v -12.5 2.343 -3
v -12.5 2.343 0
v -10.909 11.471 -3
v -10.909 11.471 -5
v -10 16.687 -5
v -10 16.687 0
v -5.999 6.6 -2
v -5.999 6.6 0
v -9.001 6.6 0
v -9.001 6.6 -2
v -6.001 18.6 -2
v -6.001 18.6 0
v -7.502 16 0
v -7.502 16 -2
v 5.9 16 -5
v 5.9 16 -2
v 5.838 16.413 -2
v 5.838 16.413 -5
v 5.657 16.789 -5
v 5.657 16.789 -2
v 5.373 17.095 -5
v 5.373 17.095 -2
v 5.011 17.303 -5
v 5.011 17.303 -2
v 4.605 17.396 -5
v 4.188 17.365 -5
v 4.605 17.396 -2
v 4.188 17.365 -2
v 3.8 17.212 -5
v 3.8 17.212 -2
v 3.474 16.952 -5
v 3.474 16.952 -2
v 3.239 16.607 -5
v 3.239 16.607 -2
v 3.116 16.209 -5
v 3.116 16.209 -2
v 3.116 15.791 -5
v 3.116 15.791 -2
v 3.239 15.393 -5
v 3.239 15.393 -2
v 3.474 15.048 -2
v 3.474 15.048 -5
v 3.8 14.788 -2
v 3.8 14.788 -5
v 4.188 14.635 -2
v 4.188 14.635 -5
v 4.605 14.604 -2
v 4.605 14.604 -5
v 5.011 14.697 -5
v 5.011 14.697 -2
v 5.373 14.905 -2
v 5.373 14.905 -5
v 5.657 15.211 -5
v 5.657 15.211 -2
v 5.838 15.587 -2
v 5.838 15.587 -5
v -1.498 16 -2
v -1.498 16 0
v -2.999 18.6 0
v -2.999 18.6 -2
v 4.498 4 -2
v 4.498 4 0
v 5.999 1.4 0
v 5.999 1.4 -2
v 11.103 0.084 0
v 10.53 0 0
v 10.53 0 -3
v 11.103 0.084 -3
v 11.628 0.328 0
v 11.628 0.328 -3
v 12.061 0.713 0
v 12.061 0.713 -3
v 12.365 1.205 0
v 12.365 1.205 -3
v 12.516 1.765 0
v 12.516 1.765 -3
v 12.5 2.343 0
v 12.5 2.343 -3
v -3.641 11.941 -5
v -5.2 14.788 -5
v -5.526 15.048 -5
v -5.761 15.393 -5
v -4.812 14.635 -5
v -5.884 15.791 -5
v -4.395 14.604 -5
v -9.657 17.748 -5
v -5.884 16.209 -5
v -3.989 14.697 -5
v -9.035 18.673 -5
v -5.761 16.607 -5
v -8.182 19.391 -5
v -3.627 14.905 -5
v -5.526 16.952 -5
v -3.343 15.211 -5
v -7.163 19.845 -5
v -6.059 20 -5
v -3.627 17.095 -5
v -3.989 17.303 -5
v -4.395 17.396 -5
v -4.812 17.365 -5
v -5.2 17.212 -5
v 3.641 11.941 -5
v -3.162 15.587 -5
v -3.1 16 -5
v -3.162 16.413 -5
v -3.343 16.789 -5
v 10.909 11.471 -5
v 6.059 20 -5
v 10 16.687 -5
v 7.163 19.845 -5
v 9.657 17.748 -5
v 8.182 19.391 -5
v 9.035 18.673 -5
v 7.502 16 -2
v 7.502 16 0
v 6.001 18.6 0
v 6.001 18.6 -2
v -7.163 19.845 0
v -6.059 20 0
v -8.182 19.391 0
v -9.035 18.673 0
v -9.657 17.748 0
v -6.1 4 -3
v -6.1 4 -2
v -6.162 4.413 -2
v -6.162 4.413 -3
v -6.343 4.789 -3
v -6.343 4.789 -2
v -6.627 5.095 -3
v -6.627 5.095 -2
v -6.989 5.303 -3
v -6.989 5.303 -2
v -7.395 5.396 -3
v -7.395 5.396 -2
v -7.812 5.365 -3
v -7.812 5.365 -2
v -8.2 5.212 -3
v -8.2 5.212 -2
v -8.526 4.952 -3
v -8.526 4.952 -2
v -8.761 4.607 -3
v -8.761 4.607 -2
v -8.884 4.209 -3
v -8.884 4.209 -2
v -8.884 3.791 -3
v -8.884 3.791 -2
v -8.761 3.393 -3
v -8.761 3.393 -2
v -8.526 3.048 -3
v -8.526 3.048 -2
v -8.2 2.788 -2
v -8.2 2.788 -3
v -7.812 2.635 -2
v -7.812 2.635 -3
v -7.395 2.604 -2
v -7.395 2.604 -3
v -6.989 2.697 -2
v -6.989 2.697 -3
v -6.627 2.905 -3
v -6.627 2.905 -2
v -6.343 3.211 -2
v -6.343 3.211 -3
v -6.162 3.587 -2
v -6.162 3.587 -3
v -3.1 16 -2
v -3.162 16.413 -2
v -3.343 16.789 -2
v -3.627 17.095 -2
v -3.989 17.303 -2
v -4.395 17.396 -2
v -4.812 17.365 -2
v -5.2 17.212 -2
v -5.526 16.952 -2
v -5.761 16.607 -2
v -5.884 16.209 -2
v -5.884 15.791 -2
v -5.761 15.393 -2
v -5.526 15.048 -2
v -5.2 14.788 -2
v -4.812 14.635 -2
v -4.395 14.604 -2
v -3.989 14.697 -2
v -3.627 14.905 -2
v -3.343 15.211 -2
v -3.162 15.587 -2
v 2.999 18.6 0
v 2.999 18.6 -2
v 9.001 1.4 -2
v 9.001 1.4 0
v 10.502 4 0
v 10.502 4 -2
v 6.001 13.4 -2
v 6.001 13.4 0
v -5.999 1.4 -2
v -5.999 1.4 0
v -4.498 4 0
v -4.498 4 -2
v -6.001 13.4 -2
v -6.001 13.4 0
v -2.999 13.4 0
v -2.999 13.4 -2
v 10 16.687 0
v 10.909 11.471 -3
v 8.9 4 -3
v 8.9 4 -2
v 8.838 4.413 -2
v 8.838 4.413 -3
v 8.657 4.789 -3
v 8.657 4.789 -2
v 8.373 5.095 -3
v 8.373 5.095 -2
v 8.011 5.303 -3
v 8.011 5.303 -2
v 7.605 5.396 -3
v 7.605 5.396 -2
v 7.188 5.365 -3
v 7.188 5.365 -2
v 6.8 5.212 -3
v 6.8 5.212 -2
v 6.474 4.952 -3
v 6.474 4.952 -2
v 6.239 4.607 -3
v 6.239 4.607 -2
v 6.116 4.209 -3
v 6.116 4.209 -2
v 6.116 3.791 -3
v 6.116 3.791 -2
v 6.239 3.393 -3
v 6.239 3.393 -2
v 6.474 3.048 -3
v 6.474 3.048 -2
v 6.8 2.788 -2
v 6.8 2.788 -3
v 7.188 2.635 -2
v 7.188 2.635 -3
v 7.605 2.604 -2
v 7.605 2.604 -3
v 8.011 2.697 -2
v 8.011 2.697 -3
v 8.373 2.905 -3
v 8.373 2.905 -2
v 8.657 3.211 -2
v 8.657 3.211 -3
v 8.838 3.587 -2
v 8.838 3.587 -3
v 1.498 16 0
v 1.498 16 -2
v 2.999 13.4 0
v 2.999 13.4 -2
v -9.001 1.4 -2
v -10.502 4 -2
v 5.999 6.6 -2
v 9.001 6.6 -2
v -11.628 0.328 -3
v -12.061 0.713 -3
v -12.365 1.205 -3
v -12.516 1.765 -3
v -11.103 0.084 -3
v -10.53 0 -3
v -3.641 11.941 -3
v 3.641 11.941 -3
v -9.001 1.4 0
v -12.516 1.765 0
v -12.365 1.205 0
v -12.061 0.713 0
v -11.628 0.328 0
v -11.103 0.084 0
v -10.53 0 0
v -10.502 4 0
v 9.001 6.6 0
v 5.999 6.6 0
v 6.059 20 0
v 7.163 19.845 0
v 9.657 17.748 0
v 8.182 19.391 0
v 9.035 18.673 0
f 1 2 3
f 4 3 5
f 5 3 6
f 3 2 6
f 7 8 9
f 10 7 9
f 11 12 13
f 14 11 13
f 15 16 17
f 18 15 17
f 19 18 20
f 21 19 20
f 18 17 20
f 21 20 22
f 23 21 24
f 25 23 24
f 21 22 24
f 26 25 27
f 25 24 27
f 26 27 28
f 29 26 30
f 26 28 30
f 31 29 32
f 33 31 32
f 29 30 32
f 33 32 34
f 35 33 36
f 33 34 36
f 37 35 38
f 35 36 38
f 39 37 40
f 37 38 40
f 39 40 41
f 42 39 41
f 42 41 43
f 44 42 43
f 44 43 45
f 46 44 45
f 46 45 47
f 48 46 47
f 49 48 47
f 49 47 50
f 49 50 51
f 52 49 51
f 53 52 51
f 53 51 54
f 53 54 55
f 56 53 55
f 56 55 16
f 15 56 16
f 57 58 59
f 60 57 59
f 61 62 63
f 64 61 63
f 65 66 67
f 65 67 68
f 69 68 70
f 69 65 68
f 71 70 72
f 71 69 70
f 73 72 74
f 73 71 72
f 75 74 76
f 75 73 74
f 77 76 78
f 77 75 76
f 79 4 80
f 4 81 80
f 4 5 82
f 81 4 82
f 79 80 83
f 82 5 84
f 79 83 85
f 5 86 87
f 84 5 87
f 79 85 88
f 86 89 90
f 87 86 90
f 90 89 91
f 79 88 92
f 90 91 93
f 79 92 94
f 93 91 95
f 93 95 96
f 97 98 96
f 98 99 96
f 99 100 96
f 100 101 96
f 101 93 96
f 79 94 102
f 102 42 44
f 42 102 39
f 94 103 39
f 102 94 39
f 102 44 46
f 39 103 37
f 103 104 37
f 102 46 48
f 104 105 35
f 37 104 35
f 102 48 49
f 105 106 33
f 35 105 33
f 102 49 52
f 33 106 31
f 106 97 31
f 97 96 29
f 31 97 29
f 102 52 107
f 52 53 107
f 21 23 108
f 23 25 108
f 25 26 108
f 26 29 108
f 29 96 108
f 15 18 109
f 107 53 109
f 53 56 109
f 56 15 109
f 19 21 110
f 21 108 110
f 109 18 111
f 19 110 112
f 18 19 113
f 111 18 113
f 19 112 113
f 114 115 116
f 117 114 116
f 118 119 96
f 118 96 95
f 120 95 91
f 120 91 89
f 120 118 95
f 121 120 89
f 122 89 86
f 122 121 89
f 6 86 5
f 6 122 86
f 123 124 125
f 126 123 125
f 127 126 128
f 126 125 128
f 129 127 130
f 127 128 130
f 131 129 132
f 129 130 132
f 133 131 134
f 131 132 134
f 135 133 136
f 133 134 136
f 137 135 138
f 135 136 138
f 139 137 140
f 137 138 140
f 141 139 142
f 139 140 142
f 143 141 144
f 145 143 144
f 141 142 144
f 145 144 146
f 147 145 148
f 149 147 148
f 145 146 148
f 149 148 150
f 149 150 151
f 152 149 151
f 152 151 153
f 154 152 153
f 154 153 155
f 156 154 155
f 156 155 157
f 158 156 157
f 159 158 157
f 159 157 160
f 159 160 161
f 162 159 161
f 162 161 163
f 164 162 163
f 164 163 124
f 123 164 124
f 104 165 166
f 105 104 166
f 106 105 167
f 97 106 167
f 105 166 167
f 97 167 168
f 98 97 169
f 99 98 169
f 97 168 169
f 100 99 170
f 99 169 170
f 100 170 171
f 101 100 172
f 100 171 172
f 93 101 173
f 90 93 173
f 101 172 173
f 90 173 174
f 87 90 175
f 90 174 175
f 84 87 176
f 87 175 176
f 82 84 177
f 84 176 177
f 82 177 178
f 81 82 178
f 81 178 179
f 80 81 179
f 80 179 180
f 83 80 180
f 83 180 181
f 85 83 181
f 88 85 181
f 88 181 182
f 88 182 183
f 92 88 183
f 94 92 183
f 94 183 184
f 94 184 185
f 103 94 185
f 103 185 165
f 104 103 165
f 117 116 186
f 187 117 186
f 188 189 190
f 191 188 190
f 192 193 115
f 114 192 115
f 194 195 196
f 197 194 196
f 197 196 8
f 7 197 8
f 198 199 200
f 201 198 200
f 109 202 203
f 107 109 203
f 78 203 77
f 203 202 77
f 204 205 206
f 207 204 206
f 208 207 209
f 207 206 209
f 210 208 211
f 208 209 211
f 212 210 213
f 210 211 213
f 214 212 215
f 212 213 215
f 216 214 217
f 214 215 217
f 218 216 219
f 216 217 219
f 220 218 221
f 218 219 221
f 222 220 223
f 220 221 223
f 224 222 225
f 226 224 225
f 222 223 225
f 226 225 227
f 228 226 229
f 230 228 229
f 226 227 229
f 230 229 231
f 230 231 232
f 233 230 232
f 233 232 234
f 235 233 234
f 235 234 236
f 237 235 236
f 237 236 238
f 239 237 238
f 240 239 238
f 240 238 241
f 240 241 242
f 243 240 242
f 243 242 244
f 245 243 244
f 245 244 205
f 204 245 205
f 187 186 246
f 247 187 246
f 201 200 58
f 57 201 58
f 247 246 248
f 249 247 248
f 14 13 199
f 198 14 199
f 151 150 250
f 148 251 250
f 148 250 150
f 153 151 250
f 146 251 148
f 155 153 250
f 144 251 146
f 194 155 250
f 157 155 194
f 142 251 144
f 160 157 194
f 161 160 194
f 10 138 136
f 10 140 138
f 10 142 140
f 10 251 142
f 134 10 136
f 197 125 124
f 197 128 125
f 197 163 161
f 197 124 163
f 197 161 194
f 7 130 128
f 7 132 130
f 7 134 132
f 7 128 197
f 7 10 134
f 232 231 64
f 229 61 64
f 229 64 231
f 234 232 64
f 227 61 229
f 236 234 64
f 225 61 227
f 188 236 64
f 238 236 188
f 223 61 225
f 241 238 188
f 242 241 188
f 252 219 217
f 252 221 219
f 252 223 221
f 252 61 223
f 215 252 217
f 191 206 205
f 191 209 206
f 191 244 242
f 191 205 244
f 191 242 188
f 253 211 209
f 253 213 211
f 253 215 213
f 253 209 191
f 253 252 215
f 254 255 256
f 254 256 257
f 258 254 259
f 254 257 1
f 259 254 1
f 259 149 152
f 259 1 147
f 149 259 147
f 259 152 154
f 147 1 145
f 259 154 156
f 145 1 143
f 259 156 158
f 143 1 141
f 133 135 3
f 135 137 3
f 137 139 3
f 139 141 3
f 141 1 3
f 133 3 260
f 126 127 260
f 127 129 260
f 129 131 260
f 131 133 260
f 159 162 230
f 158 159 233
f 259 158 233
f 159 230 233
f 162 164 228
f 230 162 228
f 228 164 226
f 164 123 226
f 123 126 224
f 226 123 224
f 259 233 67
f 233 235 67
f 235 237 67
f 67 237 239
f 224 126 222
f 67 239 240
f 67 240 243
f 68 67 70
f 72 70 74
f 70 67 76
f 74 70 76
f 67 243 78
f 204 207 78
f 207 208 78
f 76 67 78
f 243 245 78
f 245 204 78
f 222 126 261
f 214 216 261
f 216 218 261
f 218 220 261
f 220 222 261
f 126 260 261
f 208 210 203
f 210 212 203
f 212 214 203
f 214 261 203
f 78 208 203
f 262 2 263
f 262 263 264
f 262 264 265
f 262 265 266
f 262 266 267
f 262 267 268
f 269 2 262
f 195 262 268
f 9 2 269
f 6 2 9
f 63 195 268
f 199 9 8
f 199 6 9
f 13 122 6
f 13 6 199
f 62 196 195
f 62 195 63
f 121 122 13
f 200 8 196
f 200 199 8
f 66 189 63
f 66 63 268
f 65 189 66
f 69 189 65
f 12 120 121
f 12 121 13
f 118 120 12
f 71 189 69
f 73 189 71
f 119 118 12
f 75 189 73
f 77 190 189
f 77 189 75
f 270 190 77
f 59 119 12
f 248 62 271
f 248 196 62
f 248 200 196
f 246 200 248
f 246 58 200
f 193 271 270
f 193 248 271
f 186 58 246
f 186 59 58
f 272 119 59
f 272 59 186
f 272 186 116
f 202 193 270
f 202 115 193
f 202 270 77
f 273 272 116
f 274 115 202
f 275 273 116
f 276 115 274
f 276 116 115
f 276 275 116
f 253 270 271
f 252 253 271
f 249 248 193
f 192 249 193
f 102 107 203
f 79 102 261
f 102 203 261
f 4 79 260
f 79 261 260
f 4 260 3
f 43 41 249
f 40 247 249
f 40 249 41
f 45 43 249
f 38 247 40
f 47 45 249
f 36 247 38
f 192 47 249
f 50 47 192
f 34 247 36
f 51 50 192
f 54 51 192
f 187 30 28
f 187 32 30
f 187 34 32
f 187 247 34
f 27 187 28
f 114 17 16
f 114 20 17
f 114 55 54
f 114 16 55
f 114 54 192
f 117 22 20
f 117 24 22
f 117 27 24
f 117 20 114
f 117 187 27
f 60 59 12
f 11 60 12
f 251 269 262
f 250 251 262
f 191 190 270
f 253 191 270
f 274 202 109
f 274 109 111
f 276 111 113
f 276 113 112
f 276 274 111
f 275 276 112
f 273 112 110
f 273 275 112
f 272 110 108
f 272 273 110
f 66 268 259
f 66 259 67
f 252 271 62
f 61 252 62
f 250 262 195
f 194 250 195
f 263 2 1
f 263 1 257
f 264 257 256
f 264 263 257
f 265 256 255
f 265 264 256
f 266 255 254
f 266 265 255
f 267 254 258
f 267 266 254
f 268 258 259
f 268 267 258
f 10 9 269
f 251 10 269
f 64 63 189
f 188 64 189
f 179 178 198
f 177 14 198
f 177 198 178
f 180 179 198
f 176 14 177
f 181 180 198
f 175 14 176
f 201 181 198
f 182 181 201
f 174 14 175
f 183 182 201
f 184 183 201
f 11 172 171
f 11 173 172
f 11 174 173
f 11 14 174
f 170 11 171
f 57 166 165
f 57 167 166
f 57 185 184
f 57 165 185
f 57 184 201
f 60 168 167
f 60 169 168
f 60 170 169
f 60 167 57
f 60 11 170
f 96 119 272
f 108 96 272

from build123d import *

# Parameters (mm, degrees)
PAD001_DEPTH         = 5
SKETCH007_R          = 1.4
POCKET001_DEPTH      = 5.001
POCKET001_DEPTH_BACK = 0.001
POCKET002_DEPTH      = 2
SKETCH009_R          = 112.8
POCKET003_DEPTH      = 2.001


with BuildPart() as part:
    # Sketch005 → Pad001 (new body)
    with BuildSketch(Plane.XY):
        with BuildLine():
            Line((-10.529704, 0), (10.529704, 0))
            ThreePointArc((10.529704, 0), (12.060526, 0.712916), (12.5, 2.343415))
            Line((10, 16.686829), (12.5, 2.343415))
            ThreePointArc((10, 16.686829), (8.633576, 19.061643), (6.059408, 20))
            Line((-6.059408, 20), (6.059408, 20))
            ThreePointArc((-6.059408, 20), (-8.633576, 19.061643), (-10, 16.686829))
            Line((-12.5, 2.343415), (-10, 16.686829))
            ThreePointArc((-12.5, 2.343415), (-12.060526, 0.712916), (-10.529704, 0))
        make_face()
    extrude(amount=-PAD001_DEPTH)

    # Sketch007 → Pocket001 (cut, two sides)
    with BuildSketch(Plane.XY) as pocket001_sk:
        with Locations((-4.5, 16)):
            Circle(SKETCH007_R)
        with Locations((4.5, 16)):
            Circle(SKETCH007_R)
        with Locations((7.5, 4)):
            Circle(SKETCH007_R)
        with Locations((-7.5, 4)):
            Circle(SKETCH007_R)
    extrude(amount=-POCKET001_DEPTH, mode=Mode.SUBTRACT)
    extrude(pocket001_sk.sketch, amount=POCKET001_DEPTH_BACK, mode=Mode.SUBTRACT)

    # Sketch008 → Pocket002 (cut)
    with BuildSketch(Plane.XY):
        Polygon((-9.001111, 6.6), (-10.502221, 4), (-9.001111, 1.4), (-5.998889, 1.4), (-4.497779, 4), (-5.998889, 6.6), align=None)
        Polygon((9.001111, 1.4), (10.502221, 4), (9.001111, 6.6), (5.998889, 6.6), (4.497779, 4), (5.998889, 1.4), align=None)
        Polygon((6.001111, 13.4), (7.502221, 16), (6.001111, 18.6), (2.998889, 18.6), (1.497779, 16), (2.998889, 13.4), align=None)
        Polygon((-6.001111, 13.4), (-2.998889, 13.4), (-1.497779, 16), (-2.998889, 18.6), (-6.001111, 18.6), (-7.502221, 16), align=None)
    extrude(amount=-POCKET002_DEPTH, mode=Mode.SUBTRACT)

    # Sketch009 (on DatumPlane) → Pocket003 (cut, through all)
    with BuildSketch(Plane.XY.offset(-3)):
        with Locations((0, -100.8)):
            Circle(SKETCH009_R)
    extrude(amount=-POCKET003_DEPTH, mode=Mode.SUBTRACT)


solid = part.part
